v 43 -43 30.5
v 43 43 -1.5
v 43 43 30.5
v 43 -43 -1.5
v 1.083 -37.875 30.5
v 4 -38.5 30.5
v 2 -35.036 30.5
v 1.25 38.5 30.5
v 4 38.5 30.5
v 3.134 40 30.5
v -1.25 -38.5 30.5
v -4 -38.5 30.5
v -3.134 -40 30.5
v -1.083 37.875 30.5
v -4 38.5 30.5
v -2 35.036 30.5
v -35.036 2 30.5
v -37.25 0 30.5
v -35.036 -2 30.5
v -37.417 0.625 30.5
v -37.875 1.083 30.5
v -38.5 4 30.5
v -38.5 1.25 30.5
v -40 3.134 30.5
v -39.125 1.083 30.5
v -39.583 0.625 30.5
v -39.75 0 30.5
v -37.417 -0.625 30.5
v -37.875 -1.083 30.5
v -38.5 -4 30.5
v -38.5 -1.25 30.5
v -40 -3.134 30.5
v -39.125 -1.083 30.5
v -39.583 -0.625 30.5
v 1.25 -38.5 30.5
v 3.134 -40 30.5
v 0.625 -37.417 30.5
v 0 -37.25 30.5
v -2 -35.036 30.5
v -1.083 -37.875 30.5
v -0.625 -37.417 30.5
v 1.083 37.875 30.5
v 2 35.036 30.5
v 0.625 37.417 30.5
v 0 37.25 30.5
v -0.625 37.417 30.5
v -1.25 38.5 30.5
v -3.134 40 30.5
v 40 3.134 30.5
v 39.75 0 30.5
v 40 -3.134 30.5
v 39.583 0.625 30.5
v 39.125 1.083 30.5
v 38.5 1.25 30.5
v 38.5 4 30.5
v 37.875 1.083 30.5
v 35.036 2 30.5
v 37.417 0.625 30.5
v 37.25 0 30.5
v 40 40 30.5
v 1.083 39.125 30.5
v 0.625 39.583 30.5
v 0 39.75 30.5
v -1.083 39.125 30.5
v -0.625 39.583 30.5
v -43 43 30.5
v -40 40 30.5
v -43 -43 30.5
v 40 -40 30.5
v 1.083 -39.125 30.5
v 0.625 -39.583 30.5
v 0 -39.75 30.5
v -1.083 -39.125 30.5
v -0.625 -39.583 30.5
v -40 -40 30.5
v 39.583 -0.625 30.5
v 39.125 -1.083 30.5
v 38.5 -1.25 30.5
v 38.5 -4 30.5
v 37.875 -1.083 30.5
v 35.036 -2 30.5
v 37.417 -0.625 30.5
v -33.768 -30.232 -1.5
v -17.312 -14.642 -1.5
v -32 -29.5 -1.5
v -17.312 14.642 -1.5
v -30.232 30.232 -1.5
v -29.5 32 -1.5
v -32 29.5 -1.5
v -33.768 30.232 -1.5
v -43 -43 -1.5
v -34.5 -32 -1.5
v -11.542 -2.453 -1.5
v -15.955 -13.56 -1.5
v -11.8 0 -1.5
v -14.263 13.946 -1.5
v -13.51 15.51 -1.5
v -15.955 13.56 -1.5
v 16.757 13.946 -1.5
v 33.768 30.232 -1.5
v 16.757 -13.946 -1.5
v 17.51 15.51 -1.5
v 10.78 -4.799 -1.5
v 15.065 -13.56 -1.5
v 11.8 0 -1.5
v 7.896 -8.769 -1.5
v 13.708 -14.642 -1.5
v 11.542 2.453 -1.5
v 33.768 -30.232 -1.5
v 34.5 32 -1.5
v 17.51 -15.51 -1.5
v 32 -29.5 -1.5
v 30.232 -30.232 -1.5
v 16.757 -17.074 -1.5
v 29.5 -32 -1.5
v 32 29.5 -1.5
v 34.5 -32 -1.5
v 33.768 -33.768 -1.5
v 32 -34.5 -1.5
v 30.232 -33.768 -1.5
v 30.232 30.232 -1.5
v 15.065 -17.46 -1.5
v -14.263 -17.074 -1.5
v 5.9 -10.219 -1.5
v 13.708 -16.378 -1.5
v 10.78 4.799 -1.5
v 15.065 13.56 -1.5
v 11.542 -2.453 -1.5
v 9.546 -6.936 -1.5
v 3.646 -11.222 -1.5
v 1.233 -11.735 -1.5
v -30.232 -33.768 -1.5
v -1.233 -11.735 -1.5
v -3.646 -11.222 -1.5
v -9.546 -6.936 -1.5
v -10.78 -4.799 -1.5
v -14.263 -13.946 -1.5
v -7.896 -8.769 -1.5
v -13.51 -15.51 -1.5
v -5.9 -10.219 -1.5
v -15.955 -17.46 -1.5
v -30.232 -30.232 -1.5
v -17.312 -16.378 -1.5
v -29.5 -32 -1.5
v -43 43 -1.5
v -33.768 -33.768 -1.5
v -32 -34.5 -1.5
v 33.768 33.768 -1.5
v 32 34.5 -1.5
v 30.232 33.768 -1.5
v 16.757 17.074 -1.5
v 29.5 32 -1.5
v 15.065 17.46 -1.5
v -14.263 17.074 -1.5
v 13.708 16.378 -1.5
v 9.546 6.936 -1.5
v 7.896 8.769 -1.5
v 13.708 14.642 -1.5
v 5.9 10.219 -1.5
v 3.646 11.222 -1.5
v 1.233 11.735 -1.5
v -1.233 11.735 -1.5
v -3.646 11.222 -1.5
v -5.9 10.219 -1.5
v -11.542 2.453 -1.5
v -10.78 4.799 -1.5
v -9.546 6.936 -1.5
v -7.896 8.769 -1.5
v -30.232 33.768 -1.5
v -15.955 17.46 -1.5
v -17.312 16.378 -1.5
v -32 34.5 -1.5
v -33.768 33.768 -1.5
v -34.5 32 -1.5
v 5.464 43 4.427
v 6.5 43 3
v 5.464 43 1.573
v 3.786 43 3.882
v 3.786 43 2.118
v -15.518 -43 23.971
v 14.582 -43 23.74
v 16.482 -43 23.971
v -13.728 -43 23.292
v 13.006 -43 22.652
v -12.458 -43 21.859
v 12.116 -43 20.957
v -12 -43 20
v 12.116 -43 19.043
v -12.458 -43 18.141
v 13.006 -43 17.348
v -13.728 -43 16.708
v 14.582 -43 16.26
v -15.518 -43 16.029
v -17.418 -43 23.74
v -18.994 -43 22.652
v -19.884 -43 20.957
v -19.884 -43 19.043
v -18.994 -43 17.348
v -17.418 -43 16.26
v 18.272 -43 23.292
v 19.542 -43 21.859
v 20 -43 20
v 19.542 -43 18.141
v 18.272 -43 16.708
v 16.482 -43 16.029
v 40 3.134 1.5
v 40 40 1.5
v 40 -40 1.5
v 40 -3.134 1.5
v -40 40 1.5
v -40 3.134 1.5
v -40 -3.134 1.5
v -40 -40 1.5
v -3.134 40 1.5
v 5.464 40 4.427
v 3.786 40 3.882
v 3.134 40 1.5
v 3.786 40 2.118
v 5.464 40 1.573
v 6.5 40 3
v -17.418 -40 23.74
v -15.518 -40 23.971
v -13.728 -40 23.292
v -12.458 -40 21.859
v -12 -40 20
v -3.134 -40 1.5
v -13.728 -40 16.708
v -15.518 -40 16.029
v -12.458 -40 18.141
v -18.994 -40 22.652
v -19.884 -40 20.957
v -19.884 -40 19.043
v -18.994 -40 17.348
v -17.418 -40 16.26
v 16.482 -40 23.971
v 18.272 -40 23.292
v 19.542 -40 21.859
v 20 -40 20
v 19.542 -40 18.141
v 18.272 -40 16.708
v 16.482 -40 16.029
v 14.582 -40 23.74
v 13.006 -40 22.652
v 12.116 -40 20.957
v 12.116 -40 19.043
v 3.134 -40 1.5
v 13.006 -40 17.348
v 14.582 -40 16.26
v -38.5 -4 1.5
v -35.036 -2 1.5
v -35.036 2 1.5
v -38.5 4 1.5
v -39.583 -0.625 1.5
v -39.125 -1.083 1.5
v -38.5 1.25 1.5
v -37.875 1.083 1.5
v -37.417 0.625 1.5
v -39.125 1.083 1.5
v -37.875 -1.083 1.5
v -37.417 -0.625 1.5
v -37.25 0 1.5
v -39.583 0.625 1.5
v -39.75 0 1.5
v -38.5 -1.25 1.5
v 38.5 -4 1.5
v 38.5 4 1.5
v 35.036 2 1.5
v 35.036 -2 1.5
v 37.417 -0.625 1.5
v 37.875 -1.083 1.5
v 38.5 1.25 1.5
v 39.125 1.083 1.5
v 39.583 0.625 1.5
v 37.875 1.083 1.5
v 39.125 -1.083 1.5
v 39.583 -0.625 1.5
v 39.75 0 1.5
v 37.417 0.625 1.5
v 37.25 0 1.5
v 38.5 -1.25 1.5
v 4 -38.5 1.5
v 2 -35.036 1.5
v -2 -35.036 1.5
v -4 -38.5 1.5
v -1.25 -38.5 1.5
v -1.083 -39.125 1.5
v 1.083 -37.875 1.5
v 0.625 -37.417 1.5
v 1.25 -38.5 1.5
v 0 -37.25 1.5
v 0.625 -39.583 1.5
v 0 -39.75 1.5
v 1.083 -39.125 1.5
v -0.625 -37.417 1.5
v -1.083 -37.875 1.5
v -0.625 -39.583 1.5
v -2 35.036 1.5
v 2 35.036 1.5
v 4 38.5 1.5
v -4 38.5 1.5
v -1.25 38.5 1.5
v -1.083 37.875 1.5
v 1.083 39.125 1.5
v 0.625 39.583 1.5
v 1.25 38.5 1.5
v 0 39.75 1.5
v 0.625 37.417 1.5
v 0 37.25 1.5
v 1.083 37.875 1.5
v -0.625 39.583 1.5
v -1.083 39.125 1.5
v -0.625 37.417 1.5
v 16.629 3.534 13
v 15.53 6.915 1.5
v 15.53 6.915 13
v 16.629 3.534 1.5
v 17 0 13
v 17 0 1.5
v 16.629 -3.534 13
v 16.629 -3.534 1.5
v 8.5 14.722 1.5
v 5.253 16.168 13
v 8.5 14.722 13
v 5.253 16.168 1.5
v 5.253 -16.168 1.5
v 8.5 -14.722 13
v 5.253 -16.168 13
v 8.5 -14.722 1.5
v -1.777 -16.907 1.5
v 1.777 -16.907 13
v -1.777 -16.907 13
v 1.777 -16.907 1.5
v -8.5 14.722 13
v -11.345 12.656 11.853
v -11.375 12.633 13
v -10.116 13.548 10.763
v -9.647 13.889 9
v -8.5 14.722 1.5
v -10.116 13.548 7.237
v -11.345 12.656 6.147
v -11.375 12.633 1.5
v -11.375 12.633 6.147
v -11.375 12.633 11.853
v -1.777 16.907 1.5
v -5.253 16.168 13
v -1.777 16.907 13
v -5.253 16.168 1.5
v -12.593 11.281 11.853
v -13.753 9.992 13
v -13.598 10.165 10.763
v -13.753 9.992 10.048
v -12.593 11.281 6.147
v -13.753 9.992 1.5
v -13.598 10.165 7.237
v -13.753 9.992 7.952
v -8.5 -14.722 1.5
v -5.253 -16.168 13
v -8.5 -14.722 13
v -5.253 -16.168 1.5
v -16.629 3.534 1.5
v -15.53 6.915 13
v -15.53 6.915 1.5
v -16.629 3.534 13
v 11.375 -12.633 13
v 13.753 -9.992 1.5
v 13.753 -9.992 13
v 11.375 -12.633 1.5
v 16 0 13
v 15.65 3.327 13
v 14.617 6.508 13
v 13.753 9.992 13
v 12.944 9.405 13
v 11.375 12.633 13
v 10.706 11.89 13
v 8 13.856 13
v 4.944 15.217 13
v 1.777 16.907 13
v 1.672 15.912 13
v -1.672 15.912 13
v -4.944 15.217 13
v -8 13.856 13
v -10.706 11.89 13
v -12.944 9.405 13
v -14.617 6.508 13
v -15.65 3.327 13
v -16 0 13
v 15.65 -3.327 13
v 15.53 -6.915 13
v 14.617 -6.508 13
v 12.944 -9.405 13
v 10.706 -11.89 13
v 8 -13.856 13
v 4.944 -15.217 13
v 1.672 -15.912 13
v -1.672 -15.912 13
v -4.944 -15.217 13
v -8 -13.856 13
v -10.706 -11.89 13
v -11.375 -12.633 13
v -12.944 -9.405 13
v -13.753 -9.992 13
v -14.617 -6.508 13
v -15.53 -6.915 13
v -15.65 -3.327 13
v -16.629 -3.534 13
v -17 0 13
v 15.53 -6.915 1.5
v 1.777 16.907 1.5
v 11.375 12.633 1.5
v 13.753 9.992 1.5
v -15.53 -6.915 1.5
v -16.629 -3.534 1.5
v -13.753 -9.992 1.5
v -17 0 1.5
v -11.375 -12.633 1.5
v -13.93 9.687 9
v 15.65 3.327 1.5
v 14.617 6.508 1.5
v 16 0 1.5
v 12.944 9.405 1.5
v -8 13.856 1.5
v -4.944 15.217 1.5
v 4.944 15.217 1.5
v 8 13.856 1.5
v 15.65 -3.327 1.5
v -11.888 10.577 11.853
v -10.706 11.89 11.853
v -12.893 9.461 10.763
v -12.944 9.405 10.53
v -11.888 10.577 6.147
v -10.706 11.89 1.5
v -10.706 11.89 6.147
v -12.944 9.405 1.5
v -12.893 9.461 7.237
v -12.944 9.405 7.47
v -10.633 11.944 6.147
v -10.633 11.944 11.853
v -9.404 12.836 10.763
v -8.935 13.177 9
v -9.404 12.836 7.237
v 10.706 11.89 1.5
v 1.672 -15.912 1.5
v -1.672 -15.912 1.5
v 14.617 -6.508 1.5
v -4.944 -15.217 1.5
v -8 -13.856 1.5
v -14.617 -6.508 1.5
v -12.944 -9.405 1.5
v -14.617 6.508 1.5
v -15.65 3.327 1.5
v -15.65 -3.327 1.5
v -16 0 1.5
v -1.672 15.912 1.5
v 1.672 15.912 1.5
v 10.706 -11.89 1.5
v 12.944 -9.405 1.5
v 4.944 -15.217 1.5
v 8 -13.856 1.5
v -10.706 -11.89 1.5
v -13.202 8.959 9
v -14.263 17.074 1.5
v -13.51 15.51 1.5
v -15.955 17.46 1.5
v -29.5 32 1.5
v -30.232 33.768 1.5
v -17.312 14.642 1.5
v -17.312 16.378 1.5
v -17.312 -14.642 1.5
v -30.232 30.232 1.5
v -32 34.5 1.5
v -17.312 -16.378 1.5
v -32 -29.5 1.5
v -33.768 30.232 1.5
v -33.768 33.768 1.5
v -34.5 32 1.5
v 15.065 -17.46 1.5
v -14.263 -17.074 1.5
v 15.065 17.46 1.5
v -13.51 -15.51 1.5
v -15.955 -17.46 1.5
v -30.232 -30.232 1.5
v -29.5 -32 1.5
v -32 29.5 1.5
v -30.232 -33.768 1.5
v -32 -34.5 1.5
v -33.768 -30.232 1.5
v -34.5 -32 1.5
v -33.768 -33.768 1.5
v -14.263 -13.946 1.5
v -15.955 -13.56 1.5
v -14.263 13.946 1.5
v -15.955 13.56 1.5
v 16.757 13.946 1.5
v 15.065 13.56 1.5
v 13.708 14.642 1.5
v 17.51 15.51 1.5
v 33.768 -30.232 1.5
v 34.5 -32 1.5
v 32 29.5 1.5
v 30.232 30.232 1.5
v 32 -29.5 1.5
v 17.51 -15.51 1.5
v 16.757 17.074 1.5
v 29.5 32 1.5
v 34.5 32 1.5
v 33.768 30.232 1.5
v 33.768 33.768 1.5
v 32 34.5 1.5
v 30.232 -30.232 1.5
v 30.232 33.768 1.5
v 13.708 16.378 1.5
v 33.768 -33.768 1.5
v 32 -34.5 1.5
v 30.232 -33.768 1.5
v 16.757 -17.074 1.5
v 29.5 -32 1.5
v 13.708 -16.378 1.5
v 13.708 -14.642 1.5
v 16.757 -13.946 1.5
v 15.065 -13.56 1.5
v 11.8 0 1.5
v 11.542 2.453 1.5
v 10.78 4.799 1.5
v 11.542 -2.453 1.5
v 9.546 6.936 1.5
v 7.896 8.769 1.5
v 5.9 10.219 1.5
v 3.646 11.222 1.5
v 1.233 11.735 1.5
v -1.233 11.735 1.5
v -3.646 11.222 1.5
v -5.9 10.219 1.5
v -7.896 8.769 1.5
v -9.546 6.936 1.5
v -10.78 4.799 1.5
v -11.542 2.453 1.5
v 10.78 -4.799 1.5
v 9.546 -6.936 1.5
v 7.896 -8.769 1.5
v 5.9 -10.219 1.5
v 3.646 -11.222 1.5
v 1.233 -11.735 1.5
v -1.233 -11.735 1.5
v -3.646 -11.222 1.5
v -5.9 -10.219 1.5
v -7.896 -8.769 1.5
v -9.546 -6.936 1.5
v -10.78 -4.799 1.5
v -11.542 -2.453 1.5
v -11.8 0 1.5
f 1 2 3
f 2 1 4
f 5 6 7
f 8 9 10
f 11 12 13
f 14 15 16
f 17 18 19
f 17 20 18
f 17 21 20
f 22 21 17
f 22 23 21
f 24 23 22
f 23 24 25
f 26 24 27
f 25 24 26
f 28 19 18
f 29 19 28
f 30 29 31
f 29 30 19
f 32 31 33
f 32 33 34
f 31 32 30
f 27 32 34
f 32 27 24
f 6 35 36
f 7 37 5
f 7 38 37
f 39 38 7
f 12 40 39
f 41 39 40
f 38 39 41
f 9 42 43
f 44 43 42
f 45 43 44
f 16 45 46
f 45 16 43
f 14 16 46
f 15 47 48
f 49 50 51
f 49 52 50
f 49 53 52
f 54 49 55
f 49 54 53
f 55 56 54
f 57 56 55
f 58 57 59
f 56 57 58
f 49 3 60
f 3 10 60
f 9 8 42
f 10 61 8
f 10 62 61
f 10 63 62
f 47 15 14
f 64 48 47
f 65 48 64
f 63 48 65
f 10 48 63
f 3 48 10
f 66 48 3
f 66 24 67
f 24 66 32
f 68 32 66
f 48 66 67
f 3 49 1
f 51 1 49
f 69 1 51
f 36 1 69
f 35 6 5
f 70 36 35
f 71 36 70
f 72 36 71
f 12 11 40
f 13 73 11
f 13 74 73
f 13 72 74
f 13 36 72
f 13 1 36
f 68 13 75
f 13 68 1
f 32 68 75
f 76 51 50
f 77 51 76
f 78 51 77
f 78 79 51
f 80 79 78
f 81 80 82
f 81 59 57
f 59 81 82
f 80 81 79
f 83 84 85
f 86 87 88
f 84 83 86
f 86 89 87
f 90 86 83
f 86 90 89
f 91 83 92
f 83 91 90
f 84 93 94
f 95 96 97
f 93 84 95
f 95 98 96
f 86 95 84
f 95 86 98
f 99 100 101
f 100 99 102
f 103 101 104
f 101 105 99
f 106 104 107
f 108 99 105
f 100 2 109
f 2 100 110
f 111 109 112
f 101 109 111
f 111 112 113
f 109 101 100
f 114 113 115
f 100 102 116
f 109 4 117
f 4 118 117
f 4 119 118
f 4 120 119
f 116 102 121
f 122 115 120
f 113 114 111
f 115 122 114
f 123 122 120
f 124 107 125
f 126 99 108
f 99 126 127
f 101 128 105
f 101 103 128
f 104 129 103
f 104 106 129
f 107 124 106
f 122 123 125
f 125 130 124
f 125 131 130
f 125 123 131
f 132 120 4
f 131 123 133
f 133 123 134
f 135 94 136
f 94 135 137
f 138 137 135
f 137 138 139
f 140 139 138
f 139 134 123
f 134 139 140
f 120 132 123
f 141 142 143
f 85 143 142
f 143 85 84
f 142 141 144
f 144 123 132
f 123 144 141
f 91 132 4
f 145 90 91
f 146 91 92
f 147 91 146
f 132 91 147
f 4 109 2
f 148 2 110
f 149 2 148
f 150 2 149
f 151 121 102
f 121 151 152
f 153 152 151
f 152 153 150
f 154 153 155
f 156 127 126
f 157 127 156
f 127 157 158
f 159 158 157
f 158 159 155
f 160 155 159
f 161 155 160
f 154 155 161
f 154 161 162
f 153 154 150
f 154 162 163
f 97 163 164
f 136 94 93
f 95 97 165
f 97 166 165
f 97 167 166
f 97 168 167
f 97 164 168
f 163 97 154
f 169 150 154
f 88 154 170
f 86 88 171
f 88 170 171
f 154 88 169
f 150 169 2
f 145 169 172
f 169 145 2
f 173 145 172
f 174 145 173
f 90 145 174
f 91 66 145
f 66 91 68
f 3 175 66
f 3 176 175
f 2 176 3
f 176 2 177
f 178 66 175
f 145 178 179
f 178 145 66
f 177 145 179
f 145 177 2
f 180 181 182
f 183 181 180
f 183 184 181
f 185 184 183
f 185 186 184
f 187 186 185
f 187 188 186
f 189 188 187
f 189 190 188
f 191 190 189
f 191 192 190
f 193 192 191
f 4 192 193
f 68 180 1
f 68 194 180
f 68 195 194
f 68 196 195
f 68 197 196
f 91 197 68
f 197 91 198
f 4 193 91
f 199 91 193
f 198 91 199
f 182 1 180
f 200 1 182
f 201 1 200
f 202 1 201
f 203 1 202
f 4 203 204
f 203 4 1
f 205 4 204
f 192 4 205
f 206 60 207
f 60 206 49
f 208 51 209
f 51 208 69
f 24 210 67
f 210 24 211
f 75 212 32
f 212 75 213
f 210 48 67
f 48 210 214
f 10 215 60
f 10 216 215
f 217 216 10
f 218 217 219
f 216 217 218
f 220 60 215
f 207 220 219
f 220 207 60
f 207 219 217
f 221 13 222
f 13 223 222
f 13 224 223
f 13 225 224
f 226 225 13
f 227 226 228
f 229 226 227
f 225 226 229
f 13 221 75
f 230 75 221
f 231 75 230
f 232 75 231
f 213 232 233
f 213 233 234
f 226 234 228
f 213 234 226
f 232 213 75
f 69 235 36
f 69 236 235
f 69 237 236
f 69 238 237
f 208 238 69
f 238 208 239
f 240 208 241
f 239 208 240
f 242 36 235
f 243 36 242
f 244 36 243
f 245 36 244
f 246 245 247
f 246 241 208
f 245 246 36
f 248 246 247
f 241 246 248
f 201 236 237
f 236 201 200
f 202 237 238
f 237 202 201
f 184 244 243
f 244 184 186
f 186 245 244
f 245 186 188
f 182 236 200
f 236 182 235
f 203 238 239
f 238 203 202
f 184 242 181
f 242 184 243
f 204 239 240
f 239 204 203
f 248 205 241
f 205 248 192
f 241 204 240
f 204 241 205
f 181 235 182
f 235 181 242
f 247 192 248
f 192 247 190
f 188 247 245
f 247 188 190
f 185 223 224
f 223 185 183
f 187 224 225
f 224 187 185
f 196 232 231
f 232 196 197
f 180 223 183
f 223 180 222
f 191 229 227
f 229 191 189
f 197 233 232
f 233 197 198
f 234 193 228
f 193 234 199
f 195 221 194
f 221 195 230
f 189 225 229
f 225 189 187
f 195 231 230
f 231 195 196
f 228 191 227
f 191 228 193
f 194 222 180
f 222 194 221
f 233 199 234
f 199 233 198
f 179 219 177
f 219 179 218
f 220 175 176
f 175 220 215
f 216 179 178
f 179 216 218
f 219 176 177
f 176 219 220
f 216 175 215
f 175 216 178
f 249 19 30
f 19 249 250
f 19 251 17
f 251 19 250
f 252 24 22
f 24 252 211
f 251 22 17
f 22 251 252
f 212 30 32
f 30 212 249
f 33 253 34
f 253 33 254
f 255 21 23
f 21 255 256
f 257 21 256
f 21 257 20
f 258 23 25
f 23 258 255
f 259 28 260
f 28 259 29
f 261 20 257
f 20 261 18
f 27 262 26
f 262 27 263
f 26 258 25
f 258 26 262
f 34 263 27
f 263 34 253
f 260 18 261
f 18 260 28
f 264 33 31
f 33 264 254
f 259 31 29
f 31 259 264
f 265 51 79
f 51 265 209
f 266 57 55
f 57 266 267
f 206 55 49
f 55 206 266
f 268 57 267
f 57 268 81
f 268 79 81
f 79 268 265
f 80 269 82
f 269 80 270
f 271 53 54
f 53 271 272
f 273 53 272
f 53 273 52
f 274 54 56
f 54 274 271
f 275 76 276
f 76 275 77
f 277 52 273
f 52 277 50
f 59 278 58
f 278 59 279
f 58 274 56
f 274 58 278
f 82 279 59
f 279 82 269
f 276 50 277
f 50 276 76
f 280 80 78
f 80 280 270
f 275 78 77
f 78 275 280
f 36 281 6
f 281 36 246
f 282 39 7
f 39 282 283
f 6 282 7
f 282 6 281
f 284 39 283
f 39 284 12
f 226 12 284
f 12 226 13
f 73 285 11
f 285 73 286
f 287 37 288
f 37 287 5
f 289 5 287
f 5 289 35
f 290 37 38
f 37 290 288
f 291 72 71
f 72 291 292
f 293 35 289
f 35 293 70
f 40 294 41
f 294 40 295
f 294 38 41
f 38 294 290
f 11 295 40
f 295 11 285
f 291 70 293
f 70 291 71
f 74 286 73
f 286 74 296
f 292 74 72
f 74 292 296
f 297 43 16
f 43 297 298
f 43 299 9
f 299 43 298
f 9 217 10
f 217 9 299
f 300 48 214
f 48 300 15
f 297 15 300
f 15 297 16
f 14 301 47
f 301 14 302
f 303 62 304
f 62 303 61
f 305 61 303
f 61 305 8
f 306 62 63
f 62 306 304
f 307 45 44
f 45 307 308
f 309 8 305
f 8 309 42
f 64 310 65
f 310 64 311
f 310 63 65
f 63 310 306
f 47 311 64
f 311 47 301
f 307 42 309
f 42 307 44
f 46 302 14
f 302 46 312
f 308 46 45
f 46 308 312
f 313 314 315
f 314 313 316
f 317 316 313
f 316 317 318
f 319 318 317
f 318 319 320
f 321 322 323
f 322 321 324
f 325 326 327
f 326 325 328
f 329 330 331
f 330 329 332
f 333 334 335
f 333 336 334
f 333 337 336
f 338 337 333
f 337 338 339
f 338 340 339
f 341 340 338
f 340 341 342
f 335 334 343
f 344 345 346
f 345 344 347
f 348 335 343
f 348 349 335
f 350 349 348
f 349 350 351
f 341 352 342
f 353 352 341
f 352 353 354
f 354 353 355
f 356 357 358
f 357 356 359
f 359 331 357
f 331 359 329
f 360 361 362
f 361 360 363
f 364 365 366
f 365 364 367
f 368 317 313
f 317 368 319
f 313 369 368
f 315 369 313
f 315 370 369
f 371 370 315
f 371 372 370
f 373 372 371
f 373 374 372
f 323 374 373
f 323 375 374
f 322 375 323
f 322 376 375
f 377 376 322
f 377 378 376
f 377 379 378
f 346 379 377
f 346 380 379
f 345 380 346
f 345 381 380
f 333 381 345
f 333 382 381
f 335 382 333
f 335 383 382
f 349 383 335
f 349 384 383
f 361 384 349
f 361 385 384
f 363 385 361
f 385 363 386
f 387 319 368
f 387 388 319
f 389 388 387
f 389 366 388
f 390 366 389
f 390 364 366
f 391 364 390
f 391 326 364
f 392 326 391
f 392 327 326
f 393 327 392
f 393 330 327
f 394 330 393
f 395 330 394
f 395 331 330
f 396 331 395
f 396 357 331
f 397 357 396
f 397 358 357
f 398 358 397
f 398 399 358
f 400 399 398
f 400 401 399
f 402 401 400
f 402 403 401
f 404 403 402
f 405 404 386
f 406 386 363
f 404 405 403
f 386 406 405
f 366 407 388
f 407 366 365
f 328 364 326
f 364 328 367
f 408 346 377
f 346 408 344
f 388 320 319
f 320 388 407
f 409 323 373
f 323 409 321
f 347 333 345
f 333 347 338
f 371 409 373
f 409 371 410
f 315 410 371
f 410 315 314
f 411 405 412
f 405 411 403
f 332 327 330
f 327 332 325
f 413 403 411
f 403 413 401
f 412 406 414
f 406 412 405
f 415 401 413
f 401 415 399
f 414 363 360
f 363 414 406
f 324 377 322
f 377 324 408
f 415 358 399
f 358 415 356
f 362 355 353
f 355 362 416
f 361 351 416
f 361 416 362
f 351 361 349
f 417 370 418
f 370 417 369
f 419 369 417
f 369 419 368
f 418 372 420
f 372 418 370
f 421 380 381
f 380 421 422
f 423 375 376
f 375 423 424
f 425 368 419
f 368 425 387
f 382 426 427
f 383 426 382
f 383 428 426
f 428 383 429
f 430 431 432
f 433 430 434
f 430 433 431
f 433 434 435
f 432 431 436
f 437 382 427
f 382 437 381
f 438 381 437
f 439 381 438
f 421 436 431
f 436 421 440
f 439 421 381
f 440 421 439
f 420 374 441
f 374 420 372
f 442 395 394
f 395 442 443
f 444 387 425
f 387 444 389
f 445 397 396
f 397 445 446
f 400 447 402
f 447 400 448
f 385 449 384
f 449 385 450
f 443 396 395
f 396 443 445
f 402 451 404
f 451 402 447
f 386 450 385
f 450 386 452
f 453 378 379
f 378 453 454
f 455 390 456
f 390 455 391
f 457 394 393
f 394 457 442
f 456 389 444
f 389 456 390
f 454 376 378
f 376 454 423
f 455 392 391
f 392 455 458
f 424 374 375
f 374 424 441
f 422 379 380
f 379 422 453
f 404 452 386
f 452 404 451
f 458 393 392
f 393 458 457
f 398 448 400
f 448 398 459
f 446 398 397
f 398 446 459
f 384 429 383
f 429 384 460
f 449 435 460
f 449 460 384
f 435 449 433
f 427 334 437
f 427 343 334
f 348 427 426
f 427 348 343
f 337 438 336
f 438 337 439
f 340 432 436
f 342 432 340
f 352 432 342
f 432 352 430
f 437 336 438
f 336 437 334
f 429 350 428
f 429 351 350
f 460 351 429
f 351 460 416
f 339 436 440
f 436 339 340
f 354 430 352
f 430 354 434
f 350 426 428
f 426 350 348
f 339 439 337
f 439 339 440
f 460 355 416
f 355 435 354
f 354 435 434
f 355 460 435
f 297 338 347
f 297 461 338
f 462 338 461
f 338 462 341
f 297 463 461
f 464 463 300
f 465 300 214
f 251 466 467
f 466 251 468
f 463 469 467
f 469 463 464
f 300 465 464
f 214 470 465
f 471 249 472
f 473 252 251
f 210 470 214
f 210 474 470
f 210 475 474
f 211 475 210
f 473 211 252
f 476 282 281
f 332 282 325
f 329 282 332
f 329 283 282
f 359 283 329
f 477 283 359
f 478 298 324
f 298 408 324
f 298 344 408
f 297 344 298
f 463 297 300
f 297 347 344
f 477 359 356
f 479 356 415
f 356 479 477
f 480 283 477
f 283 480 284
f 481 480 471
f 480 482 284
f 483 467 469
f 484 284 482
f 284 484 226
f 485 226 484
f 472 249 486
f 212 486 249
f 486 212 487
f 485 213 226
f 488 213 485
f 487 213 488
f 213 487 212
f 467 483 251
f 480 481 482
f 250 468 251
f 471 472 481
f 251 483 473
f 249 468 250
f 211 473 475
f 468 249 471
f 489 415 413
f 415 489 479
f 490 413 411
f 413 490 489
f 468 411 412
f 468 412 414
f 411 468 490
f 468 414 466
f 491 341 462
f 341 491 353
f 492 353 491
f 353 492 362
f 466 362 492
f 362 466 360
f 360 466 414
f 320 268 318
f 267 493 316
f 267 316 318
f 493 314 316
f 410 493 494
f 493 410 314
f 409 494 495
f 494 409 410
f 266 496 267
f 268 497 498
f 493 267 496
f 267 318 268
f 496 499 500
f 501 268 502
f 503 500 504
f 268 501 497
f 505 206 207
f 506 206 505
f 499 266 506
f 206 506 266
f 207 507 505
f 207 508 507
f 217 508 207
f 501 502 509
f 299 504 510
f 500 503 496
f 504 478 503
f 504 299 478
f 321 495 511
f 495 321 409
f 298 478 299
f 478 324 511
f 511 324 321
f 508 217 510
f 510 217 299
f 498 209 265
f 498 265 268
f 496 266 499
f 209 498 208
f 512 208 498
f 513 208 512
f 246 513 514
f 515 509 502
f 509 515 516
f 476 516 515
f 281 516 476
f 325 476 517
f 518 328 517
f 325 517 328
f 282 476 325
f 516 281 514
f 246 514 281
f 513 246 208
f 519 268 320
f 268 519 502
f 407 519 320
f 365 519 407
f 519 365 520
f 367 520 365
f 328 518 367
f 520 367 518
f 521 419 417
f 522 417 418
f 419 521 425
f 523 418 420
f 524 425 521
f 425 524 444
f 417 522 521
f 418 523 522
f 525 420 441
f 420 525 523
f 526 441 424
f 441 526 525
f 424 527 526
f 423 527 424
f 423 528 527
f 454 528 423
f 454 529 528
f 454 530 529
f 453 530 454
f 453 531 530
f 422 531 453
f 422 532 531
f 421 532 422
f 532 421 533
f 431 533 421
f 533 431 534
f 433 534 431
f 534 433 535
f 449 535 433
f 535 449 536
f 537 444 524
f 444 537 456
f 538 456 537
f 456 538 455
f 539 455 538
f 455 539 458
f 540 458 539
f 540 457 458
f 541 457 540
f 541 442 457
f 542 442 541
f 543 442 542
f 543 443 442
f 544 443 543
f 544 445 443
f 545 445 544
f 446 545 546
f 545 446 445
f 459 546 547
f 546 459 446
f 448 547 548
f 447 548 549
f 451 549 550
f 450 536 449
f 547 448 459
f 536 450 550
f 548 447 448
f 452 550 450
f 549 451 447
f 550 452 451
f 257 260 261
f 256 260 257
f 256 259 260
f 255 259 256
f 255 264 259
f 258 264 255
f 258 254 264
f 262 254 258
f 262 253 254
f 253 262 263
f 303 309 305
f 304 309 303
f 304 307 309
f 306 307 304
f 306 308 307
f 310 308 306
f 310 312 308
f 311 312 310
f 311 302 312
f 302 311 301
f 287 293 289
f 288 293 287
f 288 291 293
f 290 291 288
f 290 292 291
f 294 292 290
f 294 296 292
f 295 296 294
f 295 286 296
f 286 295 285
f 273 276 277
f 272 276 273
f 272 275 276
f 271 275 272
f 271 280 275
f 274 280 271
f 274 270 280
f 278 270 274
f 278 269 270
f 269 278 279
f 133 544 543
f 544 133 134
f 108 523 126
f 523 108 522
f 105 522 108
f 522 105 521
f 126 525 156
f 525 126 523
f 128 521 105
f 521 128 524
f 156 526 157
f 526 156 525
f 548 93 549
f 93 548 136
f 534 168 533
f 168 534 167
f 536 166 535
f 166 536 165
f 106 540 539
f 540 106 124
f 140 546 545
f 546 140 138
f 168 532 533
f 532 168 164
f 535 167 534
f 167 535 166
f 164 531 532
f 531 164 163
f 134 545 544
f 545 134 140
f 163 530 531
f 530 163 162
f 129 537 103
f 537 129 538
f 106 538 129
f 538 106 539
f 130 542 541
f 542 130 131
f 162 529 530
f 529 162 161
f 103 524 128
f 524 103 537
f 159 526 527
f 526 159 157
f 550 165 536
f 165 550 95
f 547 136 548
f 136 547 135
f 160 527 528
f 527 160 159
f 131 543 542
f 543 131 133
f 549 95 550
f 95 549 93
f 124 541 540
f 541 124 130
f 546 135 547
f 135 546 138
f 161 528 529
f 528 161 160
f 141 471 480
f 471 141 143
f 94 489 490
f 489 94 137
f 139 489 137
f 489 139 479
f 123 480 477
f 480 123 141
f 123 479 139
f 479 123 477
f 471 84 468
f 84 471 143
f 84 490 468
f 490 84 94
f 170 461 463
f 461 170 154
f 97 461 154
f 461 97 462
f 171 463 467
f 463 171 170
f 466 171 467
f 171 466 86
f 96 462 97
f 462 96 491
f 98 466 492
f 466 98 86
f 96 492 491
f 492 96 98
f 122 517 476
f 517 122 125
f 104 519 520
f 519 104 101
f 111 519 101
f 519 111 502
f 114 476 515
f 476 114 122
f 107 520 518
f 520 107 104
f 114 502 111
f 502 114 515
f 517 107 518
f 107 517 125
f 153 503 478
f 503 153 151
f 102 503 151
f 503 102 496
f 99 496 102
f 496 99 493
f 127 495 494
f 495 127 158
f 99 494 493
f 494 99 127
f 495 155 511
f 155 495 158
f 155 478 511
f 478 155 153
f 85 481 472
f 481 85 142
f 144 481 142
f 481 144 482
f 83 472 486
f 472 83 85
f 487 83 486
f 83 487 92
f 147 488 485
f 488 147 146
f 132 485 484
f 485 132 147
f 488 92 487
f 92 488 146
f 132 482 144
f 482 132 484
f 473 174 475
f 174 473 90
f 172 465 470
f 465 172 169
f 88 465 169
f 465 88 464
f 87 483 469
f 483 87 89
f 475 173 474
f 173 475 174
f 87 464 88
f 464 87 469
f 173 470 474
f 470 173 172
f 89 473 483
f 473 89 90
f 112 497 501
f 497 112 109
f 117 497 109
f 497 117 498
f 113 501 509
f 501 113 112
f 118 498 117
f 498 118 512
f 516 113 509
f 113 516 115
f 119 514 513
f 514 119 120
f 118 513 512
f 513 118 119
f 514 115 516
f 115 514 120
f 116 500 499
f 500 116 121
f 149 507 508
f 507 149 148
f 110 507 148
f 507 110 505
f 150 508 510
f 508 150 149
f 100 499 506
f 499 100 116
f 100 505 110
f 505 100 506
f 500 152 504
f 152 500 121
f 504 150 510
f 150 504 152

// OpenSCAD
// file: ../parts/buttress.scad
/*
 * Written by Dermot Tynan, Kalopa Research.
 * GPLv2.
 *
 * All dimensions are in mm.
 */

/*
 * Create a buttress to reinforce a vertical column.
 * The height and length specify how high and how far out the
 * buttress goes, and the width is the width of the thing.
 */
module buttress(height, length, width)
{
	phi = atan(length / height);
	cx = length / sin(phi);
	cy = length / cos(phi);
	intersection() {
		rotate(a = [90, 90 - phi, 0])
			cube([cx, cy, width], center = true);
		translate([length/2, 0, cy*sin(phi)/2])
			cube([length, width + 2, height], center = true);
	}
}

buttress(25, 10, 2);
// file: ../parts/posts_standoffs.scad
/*
 * Written by Dermot Tynan, Kalopa Research.
 * GPLv2.
 *
 * All dimensions are in mm.
 */

use <buttress.scad>

tap_sizes = [0, 1, 1.5, 2.5, 3.3];
post_widths = [0, 6, 6, 8, 10];
soff_base = [0, 10, 10, 15, 20];

/*
 * Create a variety of screw posts.
 * Specify the height as a parameter.
 */
module screw_post(type, height)
{
	difference() {
		cylinder(r = post_widths[type]/2, h = height, center = true);
		cylinder(r = tap_sizes[type]/2, h = height + 1, center = true, $fn = 12);
	}
}

module hex_post(type, height)
{
	difference() {
		cylinder(r = post_widths[type]/2, h = height, center = true, $fn = 6);
		cylinder(r = tap_sizes[type]/2, h = height + 1, center = true, $fn = 12);
	}
}

module so_buttress(type, height)
{
	bh = height * 0.75;
	xoff = post_widths[type]/2 - 1;
	zoff = (bh - height)/2;
	translate([xoff, 0, zoff])
		buttress(bh, soff_base[type]/2 - xoff, 1.5);
}

module standoff(type, height)
{
	union() {
		translate([0, 0, -height/2]) {
			difference() {
				cylinder(r = soff_base[type]/2, h = 2, center = true, $fn = 20);
				cylinder(r = tap_sizes[type]/2, h = 3, center = true, $fn = 12);
			}
		}
		hex_post(type, height);
		rotate(a = [0, 0, 30])
			so_buttress(type, height);
		rotate(a = [0, 0, 150])
			so_buttress(type, height);
		rotate(a = [0, 0, 270])
			so_buttress(type, height);
	}
}

h1=15;
h2=35;
standoff(3, h1);
translate([0, 25, (h2-h1)/2])
	standoff(3, h2);
// file: ../parts/nema17.scad
/*
 * Written by Dermot Tynan, Kalopa Research.
 * GPLv2.
 *
 * All dimensions are in mm.
 */
module elongated_cylinder(er, eh, s)
{
	if (s > 0) {
		union() {
			translate([-s, 0, 0]) cylinder(r = er, h = eh, center = true);
			translate([s, 0, 0]) cylinder(r = er, h = eh, center = true);
			cube([s * 2, er * 2, eh], center = true);
		}
	} else {
		cylinder(r = er, h = eh, center = true);
	}
}

module nema17_shaft()
{
	difference() {
		cylinder(r = 6/2, h = 50, center = true, $fn = 20);
		translate([0, -4.5, 0]) cube([5, 5, 55], center = true);
	}
}

module nema17_motor(s)
{
	union() {
		translate([0, 0, 11]) nema17_shaft();
		elongated_cylinder(11.8, 10, s);
		translate([-15.51, -15.51, 0]) elongated_cylinder(2, 10, s);
		translate([-15.51, 15.51, 0]) elongated_cylinder(2, 10, s);
		translate([15.51, -15.51, 0]) elongated_cylinder(2, 10, s);
		translate([15.51, 15.51, 0]) elongated_cylinder(2, 10, s);
		translate([0, 0, -27]) cube(42 + 2*s, 42, 47, center = true);
	}
}

nema17_motor(4);
// file: ../gears/sail_winch.scad
/*
 * Spindle is 40mm outer edge, and has a 10.5mm slot for three
 * windings of the sheet.
 *
 * Inner diameter is 32mm.  Edge is 2mm.  Mounted on an 8mm shaft
 * thing, with a waterproof collar.
 */

use <../parts/nema17.scad>

module winch()
{
	union() {
		/*
		 * Top winch plates
		 */
		translate([0, 0, 10.5/2]) cylinder(r = 40/2, h = 2, center = true);
		cylinder(r = 32/2, h = 10.5, center = true, $fn = 60);
		translate([0, 0, -10.5/2]) cylinder(r = 40/2, h = 2, center = true);
		/*
		 * Outer skirt
		 */
		difference() {
			translate([0, 0, 12]) cylinder(r = 38/2, h = 12, center = true);
			translate([0, 0, 12]) cylinder(r = 36/2, h = 13, center = true);
		}
	}
}

module winch_gear()
{
	difference() {
		union() {
			winch();
			/*
			 * Shaft collar
			 */
			translate([0, 0, 11]) cylinder(r = 9, h = 10, center = true);
		}
		nema17_shaft();
		translate([0, -4.4, 12]) cube([5.75, 3.3, 10], center = true);
		translate([0, -12, 11]) rotate(a = [90, 0, 0]) cylinder(r = 3.9/2, h = 22, center = true);
		translate([0, -15, 11]) rotate(a = [90, 0, 0]) cylinder(r = 6/2, h = 12, center = true);
	}
}

winch_gear();
// file: stepper_box.scad
module box(x, y, z)
{
	minkowski() {
		cube([x - 20, y - 20, z], center = true);
		cylinder(r = 10, h = z, center = true);
	}
}

module m4_nut_trap()
{
	union() {
		translate([0, 0, -2]) cylinder(r = 4, h = 8, $fn = 6, center = true);
		cylinder(r = 2, h = 20, center = true, $fn = 20);
	}
}

module rudder_shaft()
{
	difference() {
		union() {
			cylinder(r = 8, h = 10, center = true);
			translate([7, 0, -3]) cube([12, 16, 4], center = true);
		}
		cylinder(r = 11/2, h = 20, center = true);
	}
}

module stepper_base()
{
	difference() {
		union() {
			box(80, 80, 2);
			translate([-32, -32, 3]) cylinder(r = 7.1, h = 10, center = true);
			translate([-32, 32, 3]) cylinder(r = 7.1, h = 10, center = true);
			translate([32, -32, 3]) cylinder(r = 7.1, h = 10, center = true);
			translate([32, 32, 3]) cylinder(r = 7.1, h = 10, center = true);
			translate([-52, 0, 3]) rudder_shaft();
		}
		translate([-32, -32, 3]) m4_nut_trap();
		translate([-32, 32, 3]) m4_nut_trap();
		translate([32, -32, 3]) m4_nut_trap();
		translate([32, 32, 3]) m4_nut_trap();
	}
}

module rudder_stepper_box()
{
	difference() {
		union() {
			translate([0, 0, 25]) box(63, 63, 25);
			stepper_base();
		}
		translate([0, 0, 22]) box(60, 60, 25);
		translate([-30, 15, 25]) rotate(a = [0, 90, 0])
				cylinder(r = 2.5, h = 10, center = true);
	}
}

module sail_stepper_box()
{
	difference() {
		union() {
			translate([0, 0, 25]) box(63, 63, 25);
			stepper_base();
		}
		translate([0, 0, 22]) box(60, 60, 25);
		translate([-30, 0, 25]) rotate(a = [0, 90, 0])
				cylinder(r = 2.5, h = 10, center = true);
	}
}

rudder_stepper_box();
// main file
/*
 * Written by Dermot Tynan, Kalopa Research.
 * GPLv2.
 *
 * All dimensions are in mm.
 */

use <stepper_box.scad>
use <../gears/sail_winch.scad>
use <../parts/nema17.scad>
use <../parts/posts_standoffs.scad>

module sailbox_wall()
{
	union() {
		difference() {
			cube([86, 86, 32], center = true);
			cube([80, 80, 34], center = true);
			translate([16, -6, 5.5]) rotate(a = [90, 0, 0]) cylinder(r = 4, h = 40);
			translate([-16, -6, 5.5]) rotate(a = [90, 0, 0]) cylinder(r = 4, h = 40);
			translate([5, 50, -11.5]) rotate(a = [90, 0, 0]) cylinder(r = 1.5, h = 20);
		}
		translate([-38.5, 0, 0]) rotate(a = [0, 0, 30]) hex_post(3, 32);
		translate([38.5, 0, 0]) rotate(a = [0, 0, 30]) hex_post(3, 32);
		translate([0, -38.5, 0]) hex_post(3, 32);
		translate([0, 38.5, 0]) hex_post(3, 32);
	}
}

module sail_cover()
{
	difference() {
		union() {
			cube([80, 80, 3], center = true);
			translate([0, 0, 14.5]) sailbox_wall();
			/*
			 * Inner skirt
			 */
			difference() {
				translate([0, 0, 7]) cylinder(r = 34/2, h = 12, center = true);
				translate([0, 0, 7]) cylinder(r = 32/2, h = 13, center = true);
				rotate(a = [0, 0, -135]) translate([0, -15, 9]) rotate(a = [90, 0, 0]) cylinder(r = 6/2, h = 12, center = true);
			}
		}
		nema17_motor(0);
		translate([-32, -32, 3]) cylinder(r = 2.5, h = 10, center = true);
		translate([-32, 32, 3]) cylinder(r = 2.5, h = 10, center = true);
		translate([32, -32, 3]) cylinder(r = 2.5, h = 10, center = true);
		translate([32, 32, 3]) cylinder(r = 2.5, h = 10, center = true);
	}
}

module assembly()
{
	union() {
		sail_cover();
		#translate([0, 0, -6]) rotate(a = [180, 0, 0]) sail_stepper_box();
		#translate([0, 0, 20]) rotate(a = [180, 0, 45]) winch_gear();
	}
}

sail_cover();
